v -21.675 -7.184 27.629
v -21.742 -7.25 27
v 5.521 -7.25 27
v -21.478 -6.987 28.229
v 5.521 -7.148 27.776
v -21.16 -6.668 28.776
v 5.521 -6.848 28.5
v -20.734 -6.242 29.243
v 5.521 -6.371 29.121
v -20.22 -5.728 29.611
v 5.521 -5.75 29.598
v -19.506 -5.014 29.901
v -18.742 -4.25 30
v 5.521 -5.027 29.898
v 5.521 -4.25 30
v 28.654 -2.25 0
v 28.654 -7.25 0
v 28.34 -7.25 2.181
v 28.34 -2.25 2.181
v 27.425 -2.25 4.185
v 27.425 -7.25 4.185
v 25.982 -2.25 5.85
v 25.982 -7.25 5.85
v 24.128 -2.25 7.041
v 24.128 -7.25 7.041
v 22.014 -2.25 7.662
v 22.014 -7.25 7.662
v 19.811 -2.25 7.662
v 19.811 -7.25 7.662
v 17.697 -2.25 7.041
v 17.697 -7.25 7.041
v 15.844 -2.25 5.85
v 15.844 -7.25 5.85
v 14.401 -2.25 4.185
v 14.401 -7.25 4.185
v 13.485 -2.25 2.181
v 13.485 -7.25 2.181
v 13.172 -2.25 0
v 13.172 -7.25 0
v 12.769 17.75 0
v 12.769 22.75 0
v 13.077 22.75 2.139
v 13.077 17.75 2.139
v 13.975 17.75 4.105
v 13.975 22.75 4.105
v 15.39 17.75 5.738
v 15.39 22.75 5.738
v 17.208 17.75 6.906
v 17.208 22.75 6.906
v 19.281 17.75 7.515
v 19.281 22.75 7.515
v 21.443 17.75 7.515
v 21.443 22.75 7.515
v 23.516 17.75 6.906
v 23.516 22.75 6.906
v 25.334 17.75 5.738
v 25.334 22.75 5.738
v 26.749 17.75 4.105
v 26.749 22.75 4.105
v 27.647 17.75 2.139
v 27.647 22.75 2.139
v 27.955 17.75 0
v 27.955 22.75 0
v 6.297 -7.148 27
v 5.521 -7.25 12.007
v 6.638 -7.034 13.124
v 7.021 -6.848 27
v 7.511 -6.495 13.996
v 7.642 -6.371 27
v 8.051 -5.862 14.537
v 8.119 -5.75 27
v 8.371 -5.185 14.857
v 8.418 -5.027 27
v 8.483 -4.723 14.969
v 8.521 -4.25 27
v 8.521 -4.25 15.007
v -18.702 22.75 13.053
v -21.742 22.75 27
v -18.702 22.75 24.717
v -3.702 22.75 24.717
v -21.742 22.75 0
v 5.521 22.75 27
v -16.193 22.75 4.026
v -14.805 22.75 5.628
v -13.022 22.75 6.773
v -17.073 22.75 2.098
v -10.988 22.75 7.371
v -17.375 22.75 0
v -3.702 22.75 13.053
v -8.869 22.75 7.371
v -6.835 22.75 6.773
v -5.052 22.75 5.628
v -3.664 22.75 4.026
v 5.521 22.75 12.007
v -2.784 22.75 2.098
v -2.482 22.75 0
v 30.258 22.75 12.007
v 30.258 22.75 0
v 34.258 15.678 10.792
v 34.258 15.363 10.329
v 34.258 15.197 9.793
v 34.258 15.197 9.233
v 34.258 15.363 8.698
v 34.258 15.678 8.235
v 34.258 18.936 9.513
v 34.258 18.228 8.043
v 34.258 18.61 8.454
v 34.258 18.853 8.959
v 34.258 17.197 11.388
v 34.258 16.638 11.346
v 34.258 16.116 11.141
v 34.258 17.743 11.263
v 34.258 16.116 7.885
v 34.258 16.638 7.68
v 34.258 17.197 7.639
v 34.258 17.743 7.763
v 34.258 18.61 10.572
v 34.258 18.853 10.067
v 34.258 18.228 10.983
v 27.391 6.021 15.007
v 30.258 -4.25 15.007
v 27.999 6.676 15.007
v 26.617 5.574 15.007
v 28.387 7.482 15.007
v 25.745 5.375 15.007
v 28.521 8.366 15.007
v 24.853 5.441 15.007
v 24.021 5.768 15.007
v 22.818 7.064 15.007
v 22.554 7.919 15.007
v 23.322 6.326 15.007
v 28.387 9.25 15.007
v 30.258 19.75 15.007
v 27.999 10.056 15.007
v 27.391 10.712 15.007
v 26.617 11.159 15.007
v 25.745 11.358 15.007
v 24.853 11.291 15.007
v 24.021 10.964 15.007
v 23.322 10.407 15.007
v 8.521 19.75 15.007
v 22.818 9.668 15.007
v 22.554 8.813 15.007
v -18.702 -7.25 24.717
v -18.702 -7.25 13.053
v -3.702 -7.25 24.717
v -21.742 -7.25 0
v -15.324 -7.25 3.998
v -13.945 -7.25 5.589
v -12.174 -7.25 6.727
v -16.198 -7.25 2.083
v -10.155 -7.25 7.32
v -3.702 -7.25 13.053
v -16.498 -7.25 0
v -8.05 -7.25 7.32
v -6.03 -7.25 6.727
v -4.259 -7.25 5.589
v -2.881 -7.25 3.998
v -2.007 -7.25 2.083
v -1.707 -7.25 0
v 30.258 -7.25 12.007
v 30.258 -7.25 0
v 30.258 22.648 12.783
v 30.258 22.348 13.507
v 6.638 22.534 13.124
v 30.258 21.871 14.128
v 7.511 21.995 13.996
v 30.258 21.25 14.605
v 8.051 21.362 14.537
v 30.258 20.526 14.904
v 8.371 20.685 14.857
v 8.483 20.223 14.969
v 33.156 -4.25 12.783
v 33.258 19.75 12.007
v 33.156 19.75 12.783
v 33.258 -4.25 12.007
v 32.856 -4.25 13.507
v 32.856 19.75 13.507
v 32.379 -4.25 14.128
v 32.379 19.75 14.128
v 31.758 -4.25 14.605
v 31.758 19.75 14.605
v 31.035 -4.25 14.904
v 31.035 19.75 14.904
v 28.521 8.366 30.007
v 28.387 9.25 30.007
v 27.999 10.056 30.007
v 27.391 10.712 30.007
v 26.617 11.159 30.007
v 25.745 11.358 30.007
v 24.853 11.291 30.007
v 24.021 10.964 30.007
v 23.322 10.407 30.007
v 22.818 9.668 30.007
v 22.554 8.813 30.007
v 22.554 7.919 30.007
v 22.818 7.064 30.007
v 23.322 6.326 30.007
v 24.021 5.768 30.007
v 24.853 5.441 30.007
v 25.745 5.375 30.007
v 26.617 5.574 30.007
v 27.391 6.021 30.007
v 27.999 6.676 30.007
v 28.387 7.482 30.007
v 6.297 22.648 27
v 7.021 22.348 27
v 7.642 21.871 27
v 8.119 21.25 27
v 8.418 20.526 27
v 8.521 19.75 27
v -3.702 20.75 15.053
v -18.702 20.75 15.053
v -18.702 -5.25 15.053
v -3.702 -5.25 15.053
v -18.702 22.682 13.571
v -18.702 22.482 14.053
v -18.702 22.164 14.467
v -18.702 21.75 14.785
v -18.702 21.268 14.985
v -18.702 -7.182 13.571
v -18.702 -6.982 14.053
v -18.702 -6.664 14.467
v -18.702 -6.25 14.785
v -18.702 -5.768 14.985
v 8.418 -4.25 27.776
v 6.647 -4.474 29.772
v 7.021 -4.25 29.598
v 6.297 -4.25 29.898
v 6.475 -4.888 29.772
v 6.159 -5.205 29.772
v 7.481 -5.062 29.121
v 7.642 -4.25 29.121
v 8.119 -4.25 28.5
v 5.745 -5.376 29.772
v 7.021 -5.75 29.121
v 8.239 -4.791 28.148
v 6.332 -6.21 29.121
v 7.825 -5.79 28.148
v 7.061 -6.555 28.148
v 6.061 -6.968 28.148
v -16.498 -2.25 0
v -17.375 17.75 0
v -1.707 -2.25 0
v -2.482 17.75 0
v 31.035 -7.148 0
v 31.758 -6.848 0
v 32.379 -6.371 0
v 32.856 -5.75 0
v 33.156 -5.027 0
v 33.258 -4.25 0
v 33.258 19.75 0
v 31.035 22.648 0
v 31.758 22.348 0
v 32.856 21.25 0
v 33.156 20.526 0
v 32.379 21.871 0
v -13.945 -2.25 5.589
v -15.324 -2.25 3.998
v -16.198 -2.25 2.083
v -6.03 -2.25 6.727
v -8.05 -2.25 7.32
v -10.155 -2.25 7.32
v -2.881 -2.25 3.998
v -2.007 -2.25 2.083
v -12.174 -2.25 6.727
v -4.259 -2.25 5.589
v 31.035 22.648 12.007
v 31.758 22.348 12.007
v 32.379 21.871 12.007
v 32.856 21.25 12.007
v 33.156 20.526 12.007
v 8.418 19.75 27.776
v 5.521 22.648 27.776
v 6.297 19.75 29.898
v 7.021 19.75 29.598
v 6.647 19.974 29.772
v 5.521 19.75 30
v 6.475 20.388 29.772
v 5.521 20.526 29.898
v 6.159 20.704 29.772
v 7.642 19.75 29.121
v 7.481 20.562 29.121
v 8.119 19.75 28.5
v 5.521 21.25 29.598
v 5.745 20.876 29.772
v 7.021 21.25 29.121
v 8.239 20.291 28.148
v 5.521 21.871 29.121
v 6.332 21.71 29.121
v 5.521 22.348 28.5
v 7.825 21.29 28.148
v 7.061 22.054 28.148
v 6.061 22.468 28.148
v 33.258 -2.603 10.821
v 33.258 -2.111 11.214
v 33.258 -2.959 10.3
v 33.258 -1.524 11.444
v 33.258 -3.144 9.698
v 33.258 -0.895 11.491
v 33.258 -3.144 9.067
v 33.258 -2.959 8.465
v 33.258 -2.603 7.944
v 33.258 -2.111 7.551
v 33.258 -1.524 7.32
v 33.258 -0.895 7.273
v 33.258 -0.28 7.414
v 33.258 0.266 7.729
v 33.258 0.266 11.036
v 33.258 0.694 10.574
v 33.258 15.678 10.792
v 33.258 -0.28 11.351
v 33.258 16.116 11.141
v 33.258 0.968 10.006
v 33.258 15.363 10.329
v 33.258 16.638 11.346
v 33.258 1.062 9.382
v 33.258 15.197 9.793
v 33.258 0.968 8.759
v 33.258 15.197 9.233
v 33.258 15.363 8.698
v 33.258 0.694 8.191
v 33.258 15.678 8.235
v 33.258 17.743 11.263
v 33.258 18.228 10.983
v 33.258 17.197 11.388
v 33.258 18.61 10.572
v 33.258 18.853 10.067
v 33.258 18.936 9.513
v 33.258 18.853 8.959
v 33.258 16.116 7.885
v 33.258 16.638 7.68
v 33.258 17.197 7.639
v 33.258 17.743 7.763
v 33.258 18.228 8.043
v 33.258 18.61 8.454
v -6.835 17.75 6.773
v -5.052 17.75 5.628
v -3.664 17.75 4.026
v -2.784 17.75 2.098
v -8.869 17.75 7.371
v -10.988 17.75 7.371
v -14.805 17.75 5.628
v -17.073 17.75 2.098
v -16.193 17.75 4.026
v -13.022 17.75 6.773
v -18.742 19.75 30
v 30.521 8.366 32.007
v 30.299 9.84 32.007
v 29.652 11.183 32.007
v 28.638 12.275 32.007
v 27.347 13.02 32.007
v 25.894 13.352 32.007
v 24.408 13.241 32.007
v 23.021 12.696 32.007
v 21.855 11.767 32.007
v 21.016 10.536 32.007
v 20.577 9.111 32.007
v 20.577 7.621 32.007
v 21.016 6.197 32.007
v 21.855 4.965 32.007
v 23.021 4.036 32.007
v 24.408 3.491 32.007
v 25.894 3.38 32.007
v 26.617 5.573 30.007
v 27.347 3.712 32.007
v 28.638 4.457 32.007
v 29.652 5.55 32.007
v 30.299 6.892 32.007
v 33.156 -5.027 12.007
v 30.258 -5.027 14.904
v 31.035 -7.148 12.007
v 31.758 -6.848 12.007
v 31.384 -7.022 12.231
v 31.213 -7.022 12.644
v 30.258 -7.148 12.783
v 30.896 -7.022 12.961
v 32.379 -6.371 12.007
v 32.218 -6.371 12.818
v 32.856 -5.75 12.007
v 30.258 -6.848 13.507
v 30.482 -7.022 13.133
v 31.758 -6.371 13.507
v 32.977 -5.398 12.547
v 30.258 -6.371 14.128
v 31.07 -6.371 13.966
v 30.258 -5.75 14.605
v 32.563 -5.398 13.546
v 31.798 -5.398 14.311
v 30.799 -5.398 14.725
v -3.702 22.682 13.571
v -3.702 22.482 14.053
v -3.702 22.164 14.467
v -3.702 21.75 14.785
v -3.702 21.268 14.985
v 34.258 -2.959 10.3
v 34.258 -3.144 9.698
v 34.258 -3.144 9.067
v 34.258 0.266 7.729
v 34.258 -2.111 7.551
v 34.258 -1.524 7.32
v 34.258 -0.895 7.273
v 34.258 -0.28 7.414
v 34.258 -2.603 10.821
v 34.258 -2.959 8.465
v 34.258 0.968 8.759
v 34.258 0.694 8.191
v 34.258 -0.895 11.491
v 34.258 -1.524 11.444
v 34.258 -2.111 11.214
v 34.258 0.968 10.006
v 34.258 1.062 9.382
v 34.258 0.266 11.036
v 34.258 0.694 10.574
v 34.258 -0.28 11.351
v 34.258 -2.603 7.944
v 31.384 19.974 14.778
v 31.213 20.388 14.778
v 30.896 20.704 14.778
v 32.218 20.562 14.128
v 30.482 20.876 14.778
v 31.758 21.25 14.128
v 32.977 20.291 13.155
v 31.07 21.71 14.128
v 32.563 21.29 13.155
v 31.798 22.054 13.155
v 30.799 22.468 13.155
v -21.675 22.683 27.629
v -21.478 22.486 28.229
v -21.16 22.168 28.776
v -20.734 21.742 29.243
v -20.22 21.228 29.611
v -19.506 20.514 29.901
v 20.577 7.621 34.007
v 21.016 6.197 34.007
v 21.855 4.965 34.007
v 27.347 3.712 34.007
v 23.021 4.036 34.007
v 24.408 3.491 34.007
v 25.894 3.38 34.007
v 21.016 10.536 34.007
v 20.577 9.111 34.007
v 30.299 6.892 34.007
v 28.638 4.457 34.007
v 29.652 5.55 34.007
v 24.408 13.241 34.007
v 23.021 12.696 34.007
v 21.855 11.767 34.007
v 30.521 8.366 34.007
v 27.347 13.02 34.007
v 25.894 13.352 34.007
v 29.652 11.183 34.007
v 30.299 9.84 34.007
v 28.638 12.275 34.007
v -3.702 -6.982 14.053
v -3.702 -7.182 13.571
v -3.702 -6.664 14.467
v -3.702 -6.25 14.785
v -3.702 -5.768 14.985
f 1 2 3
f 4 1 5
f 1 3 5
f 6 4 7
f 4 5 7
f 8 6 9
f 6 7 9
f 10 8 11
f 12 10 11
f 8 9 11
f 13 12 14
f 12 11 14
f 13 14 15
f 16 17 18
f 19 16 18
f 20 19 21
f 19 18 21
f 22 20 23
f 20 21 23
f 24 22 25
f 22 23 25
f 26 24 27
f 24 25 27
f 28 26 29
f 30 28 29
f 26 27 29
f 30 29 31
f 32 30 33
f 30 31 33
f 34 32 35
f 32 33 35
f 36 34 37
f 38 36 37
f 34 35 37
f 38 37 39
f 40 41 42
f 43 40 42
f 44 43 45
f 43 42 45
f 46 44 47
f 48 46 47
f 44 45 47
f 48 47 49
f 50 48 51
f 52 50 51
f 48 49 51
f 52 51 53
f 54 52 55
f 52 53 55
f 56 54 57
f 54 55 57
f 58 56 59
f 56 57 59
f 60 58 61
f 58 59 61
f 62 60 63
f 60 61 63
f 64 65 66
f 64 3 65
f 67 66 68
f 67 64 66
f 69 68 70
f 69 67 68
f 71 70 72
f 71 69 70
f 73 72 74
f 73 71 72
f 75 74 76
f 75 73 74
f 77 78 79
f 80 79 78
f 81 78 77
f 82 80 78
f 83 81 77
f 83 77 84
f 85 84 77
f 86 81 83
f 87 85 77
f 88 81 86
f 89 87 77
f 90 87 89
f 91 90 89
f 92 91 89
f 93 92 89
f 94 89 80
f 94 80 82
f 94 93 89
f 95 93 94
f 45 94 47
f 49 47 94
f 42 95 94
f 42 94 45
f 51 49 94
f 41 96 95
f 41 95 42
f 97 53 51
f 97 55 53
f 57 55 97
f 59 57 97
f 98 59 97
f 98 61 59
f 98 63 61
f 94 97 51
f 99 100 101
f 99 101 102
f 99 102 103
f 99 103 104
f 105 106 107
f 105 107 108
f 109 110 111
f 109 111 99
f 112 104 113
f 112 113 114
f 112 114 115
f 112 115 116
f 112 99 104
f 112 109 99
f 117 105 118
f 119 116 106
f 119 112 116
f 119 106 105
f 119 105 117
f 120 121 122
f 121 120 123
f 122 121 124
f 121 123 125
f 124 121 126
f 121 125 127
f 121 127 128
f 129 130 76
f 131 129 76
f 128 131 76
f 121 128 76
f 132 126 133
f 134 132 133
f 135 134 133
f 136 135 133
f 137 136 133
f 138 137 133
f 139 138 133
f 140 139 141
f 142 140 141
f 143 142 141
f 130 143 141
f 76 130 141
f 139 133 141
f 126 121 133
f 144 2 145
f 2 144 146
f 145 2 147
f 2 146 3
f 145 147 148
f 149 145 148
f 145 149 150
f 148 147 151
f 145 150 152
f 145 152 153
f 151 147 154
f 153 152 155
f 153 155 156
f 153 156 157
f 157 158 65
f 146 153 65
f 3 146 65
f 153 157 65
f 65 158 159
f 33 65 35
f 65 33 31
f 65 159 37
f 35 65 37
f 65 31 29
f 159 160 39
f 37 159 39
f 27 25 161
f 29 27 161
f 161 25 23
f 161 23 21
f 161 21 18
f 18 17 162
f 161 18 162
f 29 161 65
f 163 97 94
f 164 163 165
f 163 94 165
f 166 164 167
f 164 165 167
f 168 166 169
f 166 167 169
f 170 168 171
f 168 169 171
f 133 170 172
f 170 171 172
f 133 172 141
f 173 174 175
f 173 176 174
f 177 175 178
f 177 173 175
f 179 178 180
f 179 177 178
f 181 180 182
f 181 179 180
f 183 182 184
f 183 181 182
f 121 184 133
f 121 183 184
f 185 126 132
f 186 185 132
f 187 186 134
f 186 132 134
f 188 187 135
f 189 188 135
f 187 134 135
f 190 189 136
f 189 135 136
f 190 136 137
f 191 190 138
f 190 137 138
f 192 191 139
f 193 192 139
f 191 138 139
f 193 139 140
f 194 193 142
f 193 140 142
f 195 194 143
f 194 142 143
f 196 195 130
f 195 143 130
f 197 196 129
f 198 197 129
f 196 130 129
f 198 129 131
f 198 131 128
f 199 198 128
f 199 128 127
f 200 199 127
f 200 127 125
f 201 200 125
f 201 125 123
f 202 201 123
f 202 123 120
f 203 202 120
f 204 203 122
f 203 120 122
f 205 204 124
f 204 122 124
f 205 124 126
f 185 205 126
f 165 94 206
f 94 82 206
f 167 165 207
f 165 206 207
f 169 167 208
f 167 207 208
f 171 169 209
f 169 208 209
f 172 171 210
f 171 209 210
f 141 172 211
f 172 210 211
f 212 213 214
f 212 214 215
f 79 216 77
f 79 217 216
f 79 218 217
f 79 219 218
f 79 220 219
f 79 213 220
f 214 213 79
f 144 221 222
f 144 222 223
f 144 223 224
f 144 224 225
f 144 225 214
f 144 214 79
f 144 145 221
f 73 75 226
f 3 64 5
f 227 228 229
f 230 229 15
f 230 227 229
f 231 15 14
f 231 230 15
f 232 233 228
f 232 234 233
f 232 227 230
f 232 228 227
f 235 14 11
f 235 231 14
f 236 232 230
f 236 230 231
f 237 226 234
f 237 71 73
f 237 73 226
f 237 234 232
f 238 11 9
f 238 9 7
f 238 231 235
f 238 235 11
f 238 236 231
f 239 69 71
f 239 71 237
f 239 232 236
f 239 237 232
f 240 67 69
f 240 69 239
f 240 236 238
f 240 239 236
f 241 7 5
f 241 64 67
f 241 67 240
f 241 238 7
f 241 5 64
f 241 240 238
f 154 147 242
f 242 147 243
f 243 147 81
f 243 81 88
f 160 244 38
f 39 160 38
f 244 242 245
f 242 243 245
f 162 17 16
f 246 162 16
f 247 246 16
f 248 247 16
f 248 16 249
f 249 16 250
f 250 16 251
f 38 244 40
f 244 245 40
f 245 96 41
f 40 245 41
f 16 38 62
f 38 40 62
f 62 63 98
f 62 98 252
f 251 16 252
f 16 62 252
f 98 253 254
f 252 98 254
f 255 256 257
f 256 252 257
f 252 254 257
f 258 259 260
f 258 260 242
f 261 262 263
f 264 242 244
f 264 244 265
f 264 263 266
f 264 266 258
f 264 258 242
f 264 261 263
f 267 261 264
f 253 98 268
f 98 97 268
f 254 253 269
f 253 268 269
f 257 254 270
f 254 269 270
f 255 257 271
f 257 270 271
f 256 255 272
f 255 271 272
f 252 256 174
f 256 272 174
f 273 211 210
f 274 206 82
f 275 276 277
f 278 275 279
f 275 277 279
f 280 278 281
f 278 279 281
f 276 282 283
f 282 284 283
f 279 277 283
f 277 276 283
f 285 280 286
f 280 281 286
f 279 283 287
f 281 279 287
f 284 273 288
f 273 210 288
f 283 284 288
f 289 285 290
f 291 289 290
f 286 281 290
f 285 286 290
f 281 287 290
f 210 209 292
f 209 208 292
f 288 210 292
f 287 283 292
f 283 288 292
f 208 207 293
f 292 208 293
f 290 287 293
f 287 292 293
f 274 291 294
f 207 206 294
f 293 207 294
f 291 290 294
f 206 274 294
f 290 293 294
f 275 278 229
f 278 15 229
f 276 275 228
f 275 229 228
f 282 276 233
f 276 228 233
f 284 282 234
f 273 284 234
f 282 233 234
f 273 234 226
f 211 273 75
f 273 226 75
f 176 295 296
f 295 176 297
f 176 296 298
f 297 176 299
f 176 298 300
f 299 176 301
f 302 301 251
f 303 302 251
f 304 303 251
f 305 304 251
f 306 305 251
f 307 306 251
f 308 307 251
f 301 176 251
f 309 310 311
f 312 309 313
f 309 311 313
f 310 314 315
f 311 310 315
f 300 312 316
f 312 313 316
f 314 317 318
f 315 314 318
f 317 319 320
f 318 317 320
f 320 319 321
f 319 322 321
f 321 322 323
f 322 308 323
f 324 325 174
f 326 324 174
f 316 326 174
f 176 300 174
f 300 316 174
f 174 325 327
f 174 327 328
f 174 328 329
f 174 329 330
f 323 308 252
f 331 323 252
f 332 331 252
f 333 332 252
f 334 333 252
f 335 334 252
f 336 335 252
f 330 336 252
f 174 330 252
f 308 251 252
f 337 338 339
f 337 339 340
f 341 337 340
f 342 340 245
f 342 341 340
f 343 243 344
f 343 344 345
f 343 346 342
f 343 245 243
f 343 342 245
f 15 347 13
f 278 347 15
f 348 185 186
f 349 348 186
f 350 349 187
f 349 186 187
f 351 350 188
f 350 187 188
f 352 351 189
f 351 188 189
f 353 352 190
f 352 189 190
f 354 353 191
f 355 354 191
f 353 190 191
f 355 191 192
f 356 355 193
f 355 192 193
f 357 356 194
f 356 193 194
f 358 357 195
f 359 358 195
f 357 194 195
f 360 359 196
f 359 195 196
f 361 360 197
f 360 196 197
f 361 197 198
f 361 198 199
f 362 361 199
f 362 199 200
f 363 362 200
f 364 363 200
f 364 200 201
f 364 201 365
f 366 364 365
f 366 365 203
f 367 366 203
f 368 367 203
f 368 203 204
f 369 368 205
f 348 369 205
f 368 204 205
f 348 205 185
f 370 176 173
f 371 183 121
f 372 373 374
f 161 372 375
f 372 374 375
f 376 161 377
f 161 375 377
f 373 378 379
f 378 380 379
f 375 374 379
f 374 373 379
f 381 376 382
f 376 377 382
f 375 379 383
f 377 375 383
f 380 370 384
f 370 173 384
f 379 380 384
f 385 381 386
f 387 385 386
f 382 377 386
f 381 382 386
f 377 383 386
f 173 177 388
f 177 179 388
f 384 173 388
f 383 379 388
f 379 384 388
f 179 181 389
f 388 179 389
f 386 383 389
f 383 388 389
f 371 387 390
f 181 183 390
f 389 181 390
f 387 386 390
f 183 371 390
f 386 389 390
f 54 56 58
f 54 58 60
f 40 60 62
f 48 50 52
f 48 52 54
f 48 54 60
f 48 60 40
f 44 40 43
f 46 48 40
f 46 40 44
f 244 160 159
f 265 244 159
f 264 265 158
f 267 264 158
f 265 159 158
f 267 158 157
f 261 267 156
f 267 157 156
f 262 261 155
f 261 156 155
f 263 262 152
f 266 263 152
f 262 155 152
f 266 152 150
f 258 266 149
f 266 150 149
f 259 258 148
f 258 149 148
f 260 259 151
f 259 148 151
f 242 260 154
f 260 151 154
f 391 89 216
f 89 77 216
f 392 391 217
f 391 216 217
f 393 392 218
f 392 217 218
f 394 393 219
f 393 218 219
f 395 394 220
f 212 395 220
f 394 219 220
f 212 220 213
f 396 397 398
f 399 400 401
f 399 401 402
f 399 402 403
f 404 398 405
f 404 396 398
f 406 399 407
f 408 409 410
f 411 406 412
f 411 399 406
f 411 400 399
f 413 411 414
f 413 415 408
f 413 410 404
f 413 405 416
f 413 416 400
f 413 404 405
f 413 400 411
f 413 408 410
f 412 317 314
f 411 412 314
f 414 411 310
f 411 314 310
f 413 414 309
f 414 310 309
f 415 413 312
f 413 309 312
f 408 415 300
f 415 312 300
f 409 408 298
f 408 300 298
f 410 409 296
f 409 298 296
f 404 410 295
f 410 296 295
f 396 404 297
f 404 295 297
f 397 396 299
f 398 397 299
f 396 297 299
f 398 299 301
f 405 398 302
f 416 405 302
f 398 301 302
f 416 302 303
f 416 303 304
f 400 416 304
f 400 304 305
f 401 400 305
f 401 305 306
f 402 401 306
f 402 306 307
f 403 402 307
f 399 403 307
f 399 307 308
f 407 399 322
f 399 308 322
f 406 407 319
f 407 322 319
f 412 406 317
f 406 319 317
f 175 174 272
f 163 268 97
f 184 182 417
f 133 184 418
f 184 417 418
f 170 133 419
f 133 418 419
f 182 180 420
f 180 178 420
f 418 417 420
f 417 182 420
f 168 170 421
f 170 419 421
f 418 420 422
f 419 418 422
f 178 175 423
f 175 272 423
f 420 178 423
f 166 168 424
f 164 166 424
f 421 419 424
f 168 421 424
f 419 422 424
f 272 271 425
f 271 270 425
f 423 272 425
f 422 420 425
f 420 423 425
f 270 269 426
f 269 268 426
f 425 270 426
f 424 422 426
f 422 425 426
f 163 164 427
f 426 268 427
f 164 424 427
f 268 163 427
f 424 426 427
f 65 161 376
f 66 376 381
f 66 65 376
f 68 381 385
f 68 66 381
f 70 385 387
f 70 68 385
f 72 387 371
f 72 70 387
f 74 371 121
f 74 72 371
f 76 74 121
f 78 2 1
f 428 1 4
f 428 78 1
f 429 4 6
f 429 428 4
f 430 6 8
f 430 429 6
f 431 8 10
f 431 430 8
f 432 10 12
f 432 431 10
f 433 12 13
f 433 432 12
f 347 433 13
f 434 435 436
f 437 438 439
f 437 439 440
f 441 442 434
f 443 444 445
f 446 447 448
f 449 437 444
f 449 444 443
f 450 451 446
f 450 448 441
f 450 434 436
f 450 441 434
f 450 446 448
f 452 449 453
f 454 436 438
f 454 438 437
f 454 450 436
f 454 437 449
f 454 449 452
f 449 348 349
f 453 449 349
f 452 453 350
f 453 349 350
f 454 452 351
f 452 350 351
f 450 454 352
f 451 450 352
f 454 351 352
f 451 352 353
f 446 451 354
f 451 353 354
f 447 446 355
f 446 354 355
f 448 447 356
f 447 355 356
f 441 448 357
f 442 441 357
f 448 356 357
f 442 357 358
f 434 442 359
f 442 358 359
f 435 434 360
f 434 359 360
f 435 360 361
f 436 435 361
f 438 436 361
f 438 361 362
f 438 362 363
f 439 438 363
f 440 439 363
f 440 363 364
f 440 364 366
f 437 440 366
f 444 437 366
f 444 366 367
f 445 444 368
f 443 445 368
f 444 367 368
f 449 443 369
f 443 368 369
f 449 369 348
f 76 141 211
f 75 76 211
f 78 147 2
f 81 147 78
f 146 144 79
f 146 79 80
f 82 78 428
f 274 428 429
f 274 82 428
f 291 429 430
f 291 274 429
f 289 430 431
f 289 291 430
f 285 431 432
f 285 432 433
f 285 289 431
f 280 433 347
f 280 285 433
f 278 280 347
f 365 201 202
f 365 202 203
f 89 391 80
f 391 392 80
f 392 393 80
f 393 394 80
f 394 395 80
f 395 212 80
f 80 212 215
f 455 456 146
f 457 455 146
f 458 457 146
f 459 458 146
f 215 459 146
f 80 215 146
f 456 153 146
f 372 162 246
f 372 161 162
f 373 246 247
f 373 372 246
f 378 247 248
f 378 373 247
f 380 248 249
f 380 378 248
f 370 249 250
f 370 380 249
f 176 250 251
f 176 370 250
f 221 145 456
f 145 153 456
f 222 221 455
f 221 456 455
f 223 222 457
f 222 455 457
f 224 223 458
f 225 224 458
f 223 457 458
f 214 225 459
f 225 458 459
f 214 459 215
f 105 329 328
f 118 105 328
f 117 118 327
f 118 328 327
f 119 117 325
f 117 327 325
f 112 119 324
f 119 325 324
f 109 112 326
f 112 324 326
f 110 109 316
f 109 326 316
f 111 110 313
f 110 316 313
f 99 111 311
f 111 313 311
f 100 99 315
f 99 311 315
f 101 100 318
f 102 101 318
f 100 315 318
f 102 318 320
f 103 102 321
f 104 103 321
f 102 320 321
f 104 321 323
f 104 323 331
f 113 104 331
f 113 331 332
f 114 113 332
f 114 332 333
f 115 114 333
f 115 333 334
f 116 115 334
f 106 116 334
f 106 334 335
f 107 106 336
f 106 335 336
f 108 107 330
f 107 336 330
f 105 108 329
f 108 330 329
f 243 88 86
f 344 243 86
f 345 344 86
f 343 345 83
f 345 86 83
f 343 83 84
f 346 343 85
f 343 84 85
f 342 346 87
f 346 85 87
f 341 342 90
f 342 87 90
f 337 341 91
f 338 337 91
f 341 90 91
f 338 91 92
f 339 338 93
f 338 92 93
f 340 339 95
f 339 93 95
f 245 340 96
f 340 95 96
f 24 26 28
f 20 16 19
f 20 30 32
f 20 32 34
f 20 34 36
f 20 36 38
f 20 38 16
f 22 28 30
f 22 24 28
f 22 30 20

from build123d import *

# Parameters (mm, degrees)
F0_W      = 55
F0_H      = 30
F1_DEPTH  = 30
F2_W      = 24.7374541685
F2_H      = 14.993442893
F3_DEPTH  = 35
F5_DEPTH  = 5
F7_DEPTH  = 5
F8_R      = 3
F9_W      = 15
F9_H      = 9.6639953554
F10_DEPTH = 33.1
F11_R     = 2
F12_R     = 2.1149349852
F12_R_2   = 1.8799425549
F13_DEPTH = 1
F14_R     = 3
F15_DEPTH = 15
F16_R     = 5
F17_DEPTH = 4
F18_SIZE  = 1.99999


# Not quite as in the source:
# - a fillet or chamfer is up to 0.001 mm smaller than in the source, because OpenCascade refuses the exact size


with BuildPart() as f1:
    # F0 (on Top) → F1 (new body)
    with BuildSketch(Plane.XY):
        with Locations((5.7581346482, 7.7498872403)):
            Rectangle(F0_W, F0_H)
    extrude(amount=F1_DEPTH)

    # F2 (on face) → F3 (cut)
    with BuildSketch(Plane(origin=(0, 22.7498872403, 0), x_dir=(-1, 0, 0), z_dir=(0, 1, 0))):
        with Locations((-20.889407564, 22.5032785535)):
            Rectangle(F2_W, F2_H)
    extrude(amount=-F3_DEPTH, mode=Mode.SUBTRACT)

    # F4 (on face) → F5 (cut)
    with BuildSketch(Plane(origin=(0, 22.7498872403, 0), x_dir=(-1, 0, 0), z_dir=(0, 1, 0))):
        with BuildLine():
            Line((-27.9546213446, 0), (-12.7694251838, 0))
            ThreePointArc((-12.7694251838, 0), (-20.3620232642, 7.5925980804), (-27.9546213446, 0))
        make_face()
        with BuildLine():
            ThreePointArc((17.3747475732, 0), (9.9283689633, 7.4463786099), (2.4819903534, 0))
            Line((2.4819903534, 0), (17.3747475732, 0))
        make_face()
    extrude(amount=-F5_DEPTH, mode=Mode.SUBTRACT)

    # F6 (on face) → F7 (cut)
    with BuildSketch(Plane.XZ.offset(7.2501127597)):
        with BuildLine():
            Line((-16.4975558603, 0), (-1.7069804287, 0))
            ThreePointArc((-1.7069804287, 0), (-9.1022681445, 7.3952877158), (-16.4975558603, 0))
        make_face()
        with BuildLine():
            ThreePointArc((28.6537096156, 0), (20.9127571434, 7.7409524722), (13.1718046712, 0))
            Line((13.1718046712, 0), (28.6537096156, 0))
        make_face()
    extrude(amount=-F7_DEPTH, mode=Mode.SUBTRACT)

    # F8
    f8_edges = [f1.edges().sort_by_distance(p)[0] for p in [
        (8.52068, -7.250113, 22.503279),
        (8.52068, 22.749887, 22.503279),
        (33.258135, 22.749887, 7.503279),
        (33.258135, 7.749887, 15.006557),
        (33.258135, -7.250113, 7.503279),
        (8.52068, 7.749887, 30),
        (-6.610592, 22.749887, 30),
        (-21.741865, 7.749887, 30),
        (20.889408, 22.749887, 15.006557),
        (20.889408, -7.250113, 15.006557),
        (-6.610592, -7.250113, 30),
    ]]
    fillet(f8_edges, radius=F8_R)

    # F9 (on face) → F10 (cut)
    with BuildSketch(Plane.XZ.offset(7.2501127597)):
        with Locations((-11.2023635954, 19.8851507157)):
            Rectangle(F9_W, F9_H)
    extrude(amount=-F10_DEPTH, mode=Mode.SUBTRACT)

    # F11
    f11_edges = [f1.edges().sort_by_distance(p)[0] for p in [
        (-11.202364, 22.749887, 15.053153),
        (-11.202364, -7.250113, 15.053153),
    ]]
    fillet(f11_edges, radius=F11_R)

    # F12 (on face) → F13 (join)
    with BuildSketch(Plane.YZ.offset(33.2581346482)):
        with Locations((-1.053063781, 9.3823140487)):
            Circle(F12_R)
        with Locations((17.056318, 9.5132254064)):
            Circle(F12_R_2)
    extrude(amount=F13_DEPTH)

    # F14 (on face) → F15 (join)
    with BuildSketch(Plane.XY.offset(15.006557107)):
        with Locations((25.5206804797, 8.3661237732)):
            Circle(F14_R)
    extrude(amount=F15_DEPTH)

    # F16 (on face) → F17 (join)
    with BuildSketch(Plane.XY.offset(30.006557107)):
        with Locations((25.5206804797, 8.3661237732)):
            Circle(F16_R)
    extrude(amount=F17_DEPTH)

    # F18 (size 2 in the source; OpenCascade refuses exactly that, so slightly less here)
    f18_edges = [f1.edges().sort_by_distance(p)[0] for p in [
        (20.52068, 8.366124, 30.006557),
    ]]
    chamfer(f18_edges, length=F18_SIZE)


solid = f1.part
